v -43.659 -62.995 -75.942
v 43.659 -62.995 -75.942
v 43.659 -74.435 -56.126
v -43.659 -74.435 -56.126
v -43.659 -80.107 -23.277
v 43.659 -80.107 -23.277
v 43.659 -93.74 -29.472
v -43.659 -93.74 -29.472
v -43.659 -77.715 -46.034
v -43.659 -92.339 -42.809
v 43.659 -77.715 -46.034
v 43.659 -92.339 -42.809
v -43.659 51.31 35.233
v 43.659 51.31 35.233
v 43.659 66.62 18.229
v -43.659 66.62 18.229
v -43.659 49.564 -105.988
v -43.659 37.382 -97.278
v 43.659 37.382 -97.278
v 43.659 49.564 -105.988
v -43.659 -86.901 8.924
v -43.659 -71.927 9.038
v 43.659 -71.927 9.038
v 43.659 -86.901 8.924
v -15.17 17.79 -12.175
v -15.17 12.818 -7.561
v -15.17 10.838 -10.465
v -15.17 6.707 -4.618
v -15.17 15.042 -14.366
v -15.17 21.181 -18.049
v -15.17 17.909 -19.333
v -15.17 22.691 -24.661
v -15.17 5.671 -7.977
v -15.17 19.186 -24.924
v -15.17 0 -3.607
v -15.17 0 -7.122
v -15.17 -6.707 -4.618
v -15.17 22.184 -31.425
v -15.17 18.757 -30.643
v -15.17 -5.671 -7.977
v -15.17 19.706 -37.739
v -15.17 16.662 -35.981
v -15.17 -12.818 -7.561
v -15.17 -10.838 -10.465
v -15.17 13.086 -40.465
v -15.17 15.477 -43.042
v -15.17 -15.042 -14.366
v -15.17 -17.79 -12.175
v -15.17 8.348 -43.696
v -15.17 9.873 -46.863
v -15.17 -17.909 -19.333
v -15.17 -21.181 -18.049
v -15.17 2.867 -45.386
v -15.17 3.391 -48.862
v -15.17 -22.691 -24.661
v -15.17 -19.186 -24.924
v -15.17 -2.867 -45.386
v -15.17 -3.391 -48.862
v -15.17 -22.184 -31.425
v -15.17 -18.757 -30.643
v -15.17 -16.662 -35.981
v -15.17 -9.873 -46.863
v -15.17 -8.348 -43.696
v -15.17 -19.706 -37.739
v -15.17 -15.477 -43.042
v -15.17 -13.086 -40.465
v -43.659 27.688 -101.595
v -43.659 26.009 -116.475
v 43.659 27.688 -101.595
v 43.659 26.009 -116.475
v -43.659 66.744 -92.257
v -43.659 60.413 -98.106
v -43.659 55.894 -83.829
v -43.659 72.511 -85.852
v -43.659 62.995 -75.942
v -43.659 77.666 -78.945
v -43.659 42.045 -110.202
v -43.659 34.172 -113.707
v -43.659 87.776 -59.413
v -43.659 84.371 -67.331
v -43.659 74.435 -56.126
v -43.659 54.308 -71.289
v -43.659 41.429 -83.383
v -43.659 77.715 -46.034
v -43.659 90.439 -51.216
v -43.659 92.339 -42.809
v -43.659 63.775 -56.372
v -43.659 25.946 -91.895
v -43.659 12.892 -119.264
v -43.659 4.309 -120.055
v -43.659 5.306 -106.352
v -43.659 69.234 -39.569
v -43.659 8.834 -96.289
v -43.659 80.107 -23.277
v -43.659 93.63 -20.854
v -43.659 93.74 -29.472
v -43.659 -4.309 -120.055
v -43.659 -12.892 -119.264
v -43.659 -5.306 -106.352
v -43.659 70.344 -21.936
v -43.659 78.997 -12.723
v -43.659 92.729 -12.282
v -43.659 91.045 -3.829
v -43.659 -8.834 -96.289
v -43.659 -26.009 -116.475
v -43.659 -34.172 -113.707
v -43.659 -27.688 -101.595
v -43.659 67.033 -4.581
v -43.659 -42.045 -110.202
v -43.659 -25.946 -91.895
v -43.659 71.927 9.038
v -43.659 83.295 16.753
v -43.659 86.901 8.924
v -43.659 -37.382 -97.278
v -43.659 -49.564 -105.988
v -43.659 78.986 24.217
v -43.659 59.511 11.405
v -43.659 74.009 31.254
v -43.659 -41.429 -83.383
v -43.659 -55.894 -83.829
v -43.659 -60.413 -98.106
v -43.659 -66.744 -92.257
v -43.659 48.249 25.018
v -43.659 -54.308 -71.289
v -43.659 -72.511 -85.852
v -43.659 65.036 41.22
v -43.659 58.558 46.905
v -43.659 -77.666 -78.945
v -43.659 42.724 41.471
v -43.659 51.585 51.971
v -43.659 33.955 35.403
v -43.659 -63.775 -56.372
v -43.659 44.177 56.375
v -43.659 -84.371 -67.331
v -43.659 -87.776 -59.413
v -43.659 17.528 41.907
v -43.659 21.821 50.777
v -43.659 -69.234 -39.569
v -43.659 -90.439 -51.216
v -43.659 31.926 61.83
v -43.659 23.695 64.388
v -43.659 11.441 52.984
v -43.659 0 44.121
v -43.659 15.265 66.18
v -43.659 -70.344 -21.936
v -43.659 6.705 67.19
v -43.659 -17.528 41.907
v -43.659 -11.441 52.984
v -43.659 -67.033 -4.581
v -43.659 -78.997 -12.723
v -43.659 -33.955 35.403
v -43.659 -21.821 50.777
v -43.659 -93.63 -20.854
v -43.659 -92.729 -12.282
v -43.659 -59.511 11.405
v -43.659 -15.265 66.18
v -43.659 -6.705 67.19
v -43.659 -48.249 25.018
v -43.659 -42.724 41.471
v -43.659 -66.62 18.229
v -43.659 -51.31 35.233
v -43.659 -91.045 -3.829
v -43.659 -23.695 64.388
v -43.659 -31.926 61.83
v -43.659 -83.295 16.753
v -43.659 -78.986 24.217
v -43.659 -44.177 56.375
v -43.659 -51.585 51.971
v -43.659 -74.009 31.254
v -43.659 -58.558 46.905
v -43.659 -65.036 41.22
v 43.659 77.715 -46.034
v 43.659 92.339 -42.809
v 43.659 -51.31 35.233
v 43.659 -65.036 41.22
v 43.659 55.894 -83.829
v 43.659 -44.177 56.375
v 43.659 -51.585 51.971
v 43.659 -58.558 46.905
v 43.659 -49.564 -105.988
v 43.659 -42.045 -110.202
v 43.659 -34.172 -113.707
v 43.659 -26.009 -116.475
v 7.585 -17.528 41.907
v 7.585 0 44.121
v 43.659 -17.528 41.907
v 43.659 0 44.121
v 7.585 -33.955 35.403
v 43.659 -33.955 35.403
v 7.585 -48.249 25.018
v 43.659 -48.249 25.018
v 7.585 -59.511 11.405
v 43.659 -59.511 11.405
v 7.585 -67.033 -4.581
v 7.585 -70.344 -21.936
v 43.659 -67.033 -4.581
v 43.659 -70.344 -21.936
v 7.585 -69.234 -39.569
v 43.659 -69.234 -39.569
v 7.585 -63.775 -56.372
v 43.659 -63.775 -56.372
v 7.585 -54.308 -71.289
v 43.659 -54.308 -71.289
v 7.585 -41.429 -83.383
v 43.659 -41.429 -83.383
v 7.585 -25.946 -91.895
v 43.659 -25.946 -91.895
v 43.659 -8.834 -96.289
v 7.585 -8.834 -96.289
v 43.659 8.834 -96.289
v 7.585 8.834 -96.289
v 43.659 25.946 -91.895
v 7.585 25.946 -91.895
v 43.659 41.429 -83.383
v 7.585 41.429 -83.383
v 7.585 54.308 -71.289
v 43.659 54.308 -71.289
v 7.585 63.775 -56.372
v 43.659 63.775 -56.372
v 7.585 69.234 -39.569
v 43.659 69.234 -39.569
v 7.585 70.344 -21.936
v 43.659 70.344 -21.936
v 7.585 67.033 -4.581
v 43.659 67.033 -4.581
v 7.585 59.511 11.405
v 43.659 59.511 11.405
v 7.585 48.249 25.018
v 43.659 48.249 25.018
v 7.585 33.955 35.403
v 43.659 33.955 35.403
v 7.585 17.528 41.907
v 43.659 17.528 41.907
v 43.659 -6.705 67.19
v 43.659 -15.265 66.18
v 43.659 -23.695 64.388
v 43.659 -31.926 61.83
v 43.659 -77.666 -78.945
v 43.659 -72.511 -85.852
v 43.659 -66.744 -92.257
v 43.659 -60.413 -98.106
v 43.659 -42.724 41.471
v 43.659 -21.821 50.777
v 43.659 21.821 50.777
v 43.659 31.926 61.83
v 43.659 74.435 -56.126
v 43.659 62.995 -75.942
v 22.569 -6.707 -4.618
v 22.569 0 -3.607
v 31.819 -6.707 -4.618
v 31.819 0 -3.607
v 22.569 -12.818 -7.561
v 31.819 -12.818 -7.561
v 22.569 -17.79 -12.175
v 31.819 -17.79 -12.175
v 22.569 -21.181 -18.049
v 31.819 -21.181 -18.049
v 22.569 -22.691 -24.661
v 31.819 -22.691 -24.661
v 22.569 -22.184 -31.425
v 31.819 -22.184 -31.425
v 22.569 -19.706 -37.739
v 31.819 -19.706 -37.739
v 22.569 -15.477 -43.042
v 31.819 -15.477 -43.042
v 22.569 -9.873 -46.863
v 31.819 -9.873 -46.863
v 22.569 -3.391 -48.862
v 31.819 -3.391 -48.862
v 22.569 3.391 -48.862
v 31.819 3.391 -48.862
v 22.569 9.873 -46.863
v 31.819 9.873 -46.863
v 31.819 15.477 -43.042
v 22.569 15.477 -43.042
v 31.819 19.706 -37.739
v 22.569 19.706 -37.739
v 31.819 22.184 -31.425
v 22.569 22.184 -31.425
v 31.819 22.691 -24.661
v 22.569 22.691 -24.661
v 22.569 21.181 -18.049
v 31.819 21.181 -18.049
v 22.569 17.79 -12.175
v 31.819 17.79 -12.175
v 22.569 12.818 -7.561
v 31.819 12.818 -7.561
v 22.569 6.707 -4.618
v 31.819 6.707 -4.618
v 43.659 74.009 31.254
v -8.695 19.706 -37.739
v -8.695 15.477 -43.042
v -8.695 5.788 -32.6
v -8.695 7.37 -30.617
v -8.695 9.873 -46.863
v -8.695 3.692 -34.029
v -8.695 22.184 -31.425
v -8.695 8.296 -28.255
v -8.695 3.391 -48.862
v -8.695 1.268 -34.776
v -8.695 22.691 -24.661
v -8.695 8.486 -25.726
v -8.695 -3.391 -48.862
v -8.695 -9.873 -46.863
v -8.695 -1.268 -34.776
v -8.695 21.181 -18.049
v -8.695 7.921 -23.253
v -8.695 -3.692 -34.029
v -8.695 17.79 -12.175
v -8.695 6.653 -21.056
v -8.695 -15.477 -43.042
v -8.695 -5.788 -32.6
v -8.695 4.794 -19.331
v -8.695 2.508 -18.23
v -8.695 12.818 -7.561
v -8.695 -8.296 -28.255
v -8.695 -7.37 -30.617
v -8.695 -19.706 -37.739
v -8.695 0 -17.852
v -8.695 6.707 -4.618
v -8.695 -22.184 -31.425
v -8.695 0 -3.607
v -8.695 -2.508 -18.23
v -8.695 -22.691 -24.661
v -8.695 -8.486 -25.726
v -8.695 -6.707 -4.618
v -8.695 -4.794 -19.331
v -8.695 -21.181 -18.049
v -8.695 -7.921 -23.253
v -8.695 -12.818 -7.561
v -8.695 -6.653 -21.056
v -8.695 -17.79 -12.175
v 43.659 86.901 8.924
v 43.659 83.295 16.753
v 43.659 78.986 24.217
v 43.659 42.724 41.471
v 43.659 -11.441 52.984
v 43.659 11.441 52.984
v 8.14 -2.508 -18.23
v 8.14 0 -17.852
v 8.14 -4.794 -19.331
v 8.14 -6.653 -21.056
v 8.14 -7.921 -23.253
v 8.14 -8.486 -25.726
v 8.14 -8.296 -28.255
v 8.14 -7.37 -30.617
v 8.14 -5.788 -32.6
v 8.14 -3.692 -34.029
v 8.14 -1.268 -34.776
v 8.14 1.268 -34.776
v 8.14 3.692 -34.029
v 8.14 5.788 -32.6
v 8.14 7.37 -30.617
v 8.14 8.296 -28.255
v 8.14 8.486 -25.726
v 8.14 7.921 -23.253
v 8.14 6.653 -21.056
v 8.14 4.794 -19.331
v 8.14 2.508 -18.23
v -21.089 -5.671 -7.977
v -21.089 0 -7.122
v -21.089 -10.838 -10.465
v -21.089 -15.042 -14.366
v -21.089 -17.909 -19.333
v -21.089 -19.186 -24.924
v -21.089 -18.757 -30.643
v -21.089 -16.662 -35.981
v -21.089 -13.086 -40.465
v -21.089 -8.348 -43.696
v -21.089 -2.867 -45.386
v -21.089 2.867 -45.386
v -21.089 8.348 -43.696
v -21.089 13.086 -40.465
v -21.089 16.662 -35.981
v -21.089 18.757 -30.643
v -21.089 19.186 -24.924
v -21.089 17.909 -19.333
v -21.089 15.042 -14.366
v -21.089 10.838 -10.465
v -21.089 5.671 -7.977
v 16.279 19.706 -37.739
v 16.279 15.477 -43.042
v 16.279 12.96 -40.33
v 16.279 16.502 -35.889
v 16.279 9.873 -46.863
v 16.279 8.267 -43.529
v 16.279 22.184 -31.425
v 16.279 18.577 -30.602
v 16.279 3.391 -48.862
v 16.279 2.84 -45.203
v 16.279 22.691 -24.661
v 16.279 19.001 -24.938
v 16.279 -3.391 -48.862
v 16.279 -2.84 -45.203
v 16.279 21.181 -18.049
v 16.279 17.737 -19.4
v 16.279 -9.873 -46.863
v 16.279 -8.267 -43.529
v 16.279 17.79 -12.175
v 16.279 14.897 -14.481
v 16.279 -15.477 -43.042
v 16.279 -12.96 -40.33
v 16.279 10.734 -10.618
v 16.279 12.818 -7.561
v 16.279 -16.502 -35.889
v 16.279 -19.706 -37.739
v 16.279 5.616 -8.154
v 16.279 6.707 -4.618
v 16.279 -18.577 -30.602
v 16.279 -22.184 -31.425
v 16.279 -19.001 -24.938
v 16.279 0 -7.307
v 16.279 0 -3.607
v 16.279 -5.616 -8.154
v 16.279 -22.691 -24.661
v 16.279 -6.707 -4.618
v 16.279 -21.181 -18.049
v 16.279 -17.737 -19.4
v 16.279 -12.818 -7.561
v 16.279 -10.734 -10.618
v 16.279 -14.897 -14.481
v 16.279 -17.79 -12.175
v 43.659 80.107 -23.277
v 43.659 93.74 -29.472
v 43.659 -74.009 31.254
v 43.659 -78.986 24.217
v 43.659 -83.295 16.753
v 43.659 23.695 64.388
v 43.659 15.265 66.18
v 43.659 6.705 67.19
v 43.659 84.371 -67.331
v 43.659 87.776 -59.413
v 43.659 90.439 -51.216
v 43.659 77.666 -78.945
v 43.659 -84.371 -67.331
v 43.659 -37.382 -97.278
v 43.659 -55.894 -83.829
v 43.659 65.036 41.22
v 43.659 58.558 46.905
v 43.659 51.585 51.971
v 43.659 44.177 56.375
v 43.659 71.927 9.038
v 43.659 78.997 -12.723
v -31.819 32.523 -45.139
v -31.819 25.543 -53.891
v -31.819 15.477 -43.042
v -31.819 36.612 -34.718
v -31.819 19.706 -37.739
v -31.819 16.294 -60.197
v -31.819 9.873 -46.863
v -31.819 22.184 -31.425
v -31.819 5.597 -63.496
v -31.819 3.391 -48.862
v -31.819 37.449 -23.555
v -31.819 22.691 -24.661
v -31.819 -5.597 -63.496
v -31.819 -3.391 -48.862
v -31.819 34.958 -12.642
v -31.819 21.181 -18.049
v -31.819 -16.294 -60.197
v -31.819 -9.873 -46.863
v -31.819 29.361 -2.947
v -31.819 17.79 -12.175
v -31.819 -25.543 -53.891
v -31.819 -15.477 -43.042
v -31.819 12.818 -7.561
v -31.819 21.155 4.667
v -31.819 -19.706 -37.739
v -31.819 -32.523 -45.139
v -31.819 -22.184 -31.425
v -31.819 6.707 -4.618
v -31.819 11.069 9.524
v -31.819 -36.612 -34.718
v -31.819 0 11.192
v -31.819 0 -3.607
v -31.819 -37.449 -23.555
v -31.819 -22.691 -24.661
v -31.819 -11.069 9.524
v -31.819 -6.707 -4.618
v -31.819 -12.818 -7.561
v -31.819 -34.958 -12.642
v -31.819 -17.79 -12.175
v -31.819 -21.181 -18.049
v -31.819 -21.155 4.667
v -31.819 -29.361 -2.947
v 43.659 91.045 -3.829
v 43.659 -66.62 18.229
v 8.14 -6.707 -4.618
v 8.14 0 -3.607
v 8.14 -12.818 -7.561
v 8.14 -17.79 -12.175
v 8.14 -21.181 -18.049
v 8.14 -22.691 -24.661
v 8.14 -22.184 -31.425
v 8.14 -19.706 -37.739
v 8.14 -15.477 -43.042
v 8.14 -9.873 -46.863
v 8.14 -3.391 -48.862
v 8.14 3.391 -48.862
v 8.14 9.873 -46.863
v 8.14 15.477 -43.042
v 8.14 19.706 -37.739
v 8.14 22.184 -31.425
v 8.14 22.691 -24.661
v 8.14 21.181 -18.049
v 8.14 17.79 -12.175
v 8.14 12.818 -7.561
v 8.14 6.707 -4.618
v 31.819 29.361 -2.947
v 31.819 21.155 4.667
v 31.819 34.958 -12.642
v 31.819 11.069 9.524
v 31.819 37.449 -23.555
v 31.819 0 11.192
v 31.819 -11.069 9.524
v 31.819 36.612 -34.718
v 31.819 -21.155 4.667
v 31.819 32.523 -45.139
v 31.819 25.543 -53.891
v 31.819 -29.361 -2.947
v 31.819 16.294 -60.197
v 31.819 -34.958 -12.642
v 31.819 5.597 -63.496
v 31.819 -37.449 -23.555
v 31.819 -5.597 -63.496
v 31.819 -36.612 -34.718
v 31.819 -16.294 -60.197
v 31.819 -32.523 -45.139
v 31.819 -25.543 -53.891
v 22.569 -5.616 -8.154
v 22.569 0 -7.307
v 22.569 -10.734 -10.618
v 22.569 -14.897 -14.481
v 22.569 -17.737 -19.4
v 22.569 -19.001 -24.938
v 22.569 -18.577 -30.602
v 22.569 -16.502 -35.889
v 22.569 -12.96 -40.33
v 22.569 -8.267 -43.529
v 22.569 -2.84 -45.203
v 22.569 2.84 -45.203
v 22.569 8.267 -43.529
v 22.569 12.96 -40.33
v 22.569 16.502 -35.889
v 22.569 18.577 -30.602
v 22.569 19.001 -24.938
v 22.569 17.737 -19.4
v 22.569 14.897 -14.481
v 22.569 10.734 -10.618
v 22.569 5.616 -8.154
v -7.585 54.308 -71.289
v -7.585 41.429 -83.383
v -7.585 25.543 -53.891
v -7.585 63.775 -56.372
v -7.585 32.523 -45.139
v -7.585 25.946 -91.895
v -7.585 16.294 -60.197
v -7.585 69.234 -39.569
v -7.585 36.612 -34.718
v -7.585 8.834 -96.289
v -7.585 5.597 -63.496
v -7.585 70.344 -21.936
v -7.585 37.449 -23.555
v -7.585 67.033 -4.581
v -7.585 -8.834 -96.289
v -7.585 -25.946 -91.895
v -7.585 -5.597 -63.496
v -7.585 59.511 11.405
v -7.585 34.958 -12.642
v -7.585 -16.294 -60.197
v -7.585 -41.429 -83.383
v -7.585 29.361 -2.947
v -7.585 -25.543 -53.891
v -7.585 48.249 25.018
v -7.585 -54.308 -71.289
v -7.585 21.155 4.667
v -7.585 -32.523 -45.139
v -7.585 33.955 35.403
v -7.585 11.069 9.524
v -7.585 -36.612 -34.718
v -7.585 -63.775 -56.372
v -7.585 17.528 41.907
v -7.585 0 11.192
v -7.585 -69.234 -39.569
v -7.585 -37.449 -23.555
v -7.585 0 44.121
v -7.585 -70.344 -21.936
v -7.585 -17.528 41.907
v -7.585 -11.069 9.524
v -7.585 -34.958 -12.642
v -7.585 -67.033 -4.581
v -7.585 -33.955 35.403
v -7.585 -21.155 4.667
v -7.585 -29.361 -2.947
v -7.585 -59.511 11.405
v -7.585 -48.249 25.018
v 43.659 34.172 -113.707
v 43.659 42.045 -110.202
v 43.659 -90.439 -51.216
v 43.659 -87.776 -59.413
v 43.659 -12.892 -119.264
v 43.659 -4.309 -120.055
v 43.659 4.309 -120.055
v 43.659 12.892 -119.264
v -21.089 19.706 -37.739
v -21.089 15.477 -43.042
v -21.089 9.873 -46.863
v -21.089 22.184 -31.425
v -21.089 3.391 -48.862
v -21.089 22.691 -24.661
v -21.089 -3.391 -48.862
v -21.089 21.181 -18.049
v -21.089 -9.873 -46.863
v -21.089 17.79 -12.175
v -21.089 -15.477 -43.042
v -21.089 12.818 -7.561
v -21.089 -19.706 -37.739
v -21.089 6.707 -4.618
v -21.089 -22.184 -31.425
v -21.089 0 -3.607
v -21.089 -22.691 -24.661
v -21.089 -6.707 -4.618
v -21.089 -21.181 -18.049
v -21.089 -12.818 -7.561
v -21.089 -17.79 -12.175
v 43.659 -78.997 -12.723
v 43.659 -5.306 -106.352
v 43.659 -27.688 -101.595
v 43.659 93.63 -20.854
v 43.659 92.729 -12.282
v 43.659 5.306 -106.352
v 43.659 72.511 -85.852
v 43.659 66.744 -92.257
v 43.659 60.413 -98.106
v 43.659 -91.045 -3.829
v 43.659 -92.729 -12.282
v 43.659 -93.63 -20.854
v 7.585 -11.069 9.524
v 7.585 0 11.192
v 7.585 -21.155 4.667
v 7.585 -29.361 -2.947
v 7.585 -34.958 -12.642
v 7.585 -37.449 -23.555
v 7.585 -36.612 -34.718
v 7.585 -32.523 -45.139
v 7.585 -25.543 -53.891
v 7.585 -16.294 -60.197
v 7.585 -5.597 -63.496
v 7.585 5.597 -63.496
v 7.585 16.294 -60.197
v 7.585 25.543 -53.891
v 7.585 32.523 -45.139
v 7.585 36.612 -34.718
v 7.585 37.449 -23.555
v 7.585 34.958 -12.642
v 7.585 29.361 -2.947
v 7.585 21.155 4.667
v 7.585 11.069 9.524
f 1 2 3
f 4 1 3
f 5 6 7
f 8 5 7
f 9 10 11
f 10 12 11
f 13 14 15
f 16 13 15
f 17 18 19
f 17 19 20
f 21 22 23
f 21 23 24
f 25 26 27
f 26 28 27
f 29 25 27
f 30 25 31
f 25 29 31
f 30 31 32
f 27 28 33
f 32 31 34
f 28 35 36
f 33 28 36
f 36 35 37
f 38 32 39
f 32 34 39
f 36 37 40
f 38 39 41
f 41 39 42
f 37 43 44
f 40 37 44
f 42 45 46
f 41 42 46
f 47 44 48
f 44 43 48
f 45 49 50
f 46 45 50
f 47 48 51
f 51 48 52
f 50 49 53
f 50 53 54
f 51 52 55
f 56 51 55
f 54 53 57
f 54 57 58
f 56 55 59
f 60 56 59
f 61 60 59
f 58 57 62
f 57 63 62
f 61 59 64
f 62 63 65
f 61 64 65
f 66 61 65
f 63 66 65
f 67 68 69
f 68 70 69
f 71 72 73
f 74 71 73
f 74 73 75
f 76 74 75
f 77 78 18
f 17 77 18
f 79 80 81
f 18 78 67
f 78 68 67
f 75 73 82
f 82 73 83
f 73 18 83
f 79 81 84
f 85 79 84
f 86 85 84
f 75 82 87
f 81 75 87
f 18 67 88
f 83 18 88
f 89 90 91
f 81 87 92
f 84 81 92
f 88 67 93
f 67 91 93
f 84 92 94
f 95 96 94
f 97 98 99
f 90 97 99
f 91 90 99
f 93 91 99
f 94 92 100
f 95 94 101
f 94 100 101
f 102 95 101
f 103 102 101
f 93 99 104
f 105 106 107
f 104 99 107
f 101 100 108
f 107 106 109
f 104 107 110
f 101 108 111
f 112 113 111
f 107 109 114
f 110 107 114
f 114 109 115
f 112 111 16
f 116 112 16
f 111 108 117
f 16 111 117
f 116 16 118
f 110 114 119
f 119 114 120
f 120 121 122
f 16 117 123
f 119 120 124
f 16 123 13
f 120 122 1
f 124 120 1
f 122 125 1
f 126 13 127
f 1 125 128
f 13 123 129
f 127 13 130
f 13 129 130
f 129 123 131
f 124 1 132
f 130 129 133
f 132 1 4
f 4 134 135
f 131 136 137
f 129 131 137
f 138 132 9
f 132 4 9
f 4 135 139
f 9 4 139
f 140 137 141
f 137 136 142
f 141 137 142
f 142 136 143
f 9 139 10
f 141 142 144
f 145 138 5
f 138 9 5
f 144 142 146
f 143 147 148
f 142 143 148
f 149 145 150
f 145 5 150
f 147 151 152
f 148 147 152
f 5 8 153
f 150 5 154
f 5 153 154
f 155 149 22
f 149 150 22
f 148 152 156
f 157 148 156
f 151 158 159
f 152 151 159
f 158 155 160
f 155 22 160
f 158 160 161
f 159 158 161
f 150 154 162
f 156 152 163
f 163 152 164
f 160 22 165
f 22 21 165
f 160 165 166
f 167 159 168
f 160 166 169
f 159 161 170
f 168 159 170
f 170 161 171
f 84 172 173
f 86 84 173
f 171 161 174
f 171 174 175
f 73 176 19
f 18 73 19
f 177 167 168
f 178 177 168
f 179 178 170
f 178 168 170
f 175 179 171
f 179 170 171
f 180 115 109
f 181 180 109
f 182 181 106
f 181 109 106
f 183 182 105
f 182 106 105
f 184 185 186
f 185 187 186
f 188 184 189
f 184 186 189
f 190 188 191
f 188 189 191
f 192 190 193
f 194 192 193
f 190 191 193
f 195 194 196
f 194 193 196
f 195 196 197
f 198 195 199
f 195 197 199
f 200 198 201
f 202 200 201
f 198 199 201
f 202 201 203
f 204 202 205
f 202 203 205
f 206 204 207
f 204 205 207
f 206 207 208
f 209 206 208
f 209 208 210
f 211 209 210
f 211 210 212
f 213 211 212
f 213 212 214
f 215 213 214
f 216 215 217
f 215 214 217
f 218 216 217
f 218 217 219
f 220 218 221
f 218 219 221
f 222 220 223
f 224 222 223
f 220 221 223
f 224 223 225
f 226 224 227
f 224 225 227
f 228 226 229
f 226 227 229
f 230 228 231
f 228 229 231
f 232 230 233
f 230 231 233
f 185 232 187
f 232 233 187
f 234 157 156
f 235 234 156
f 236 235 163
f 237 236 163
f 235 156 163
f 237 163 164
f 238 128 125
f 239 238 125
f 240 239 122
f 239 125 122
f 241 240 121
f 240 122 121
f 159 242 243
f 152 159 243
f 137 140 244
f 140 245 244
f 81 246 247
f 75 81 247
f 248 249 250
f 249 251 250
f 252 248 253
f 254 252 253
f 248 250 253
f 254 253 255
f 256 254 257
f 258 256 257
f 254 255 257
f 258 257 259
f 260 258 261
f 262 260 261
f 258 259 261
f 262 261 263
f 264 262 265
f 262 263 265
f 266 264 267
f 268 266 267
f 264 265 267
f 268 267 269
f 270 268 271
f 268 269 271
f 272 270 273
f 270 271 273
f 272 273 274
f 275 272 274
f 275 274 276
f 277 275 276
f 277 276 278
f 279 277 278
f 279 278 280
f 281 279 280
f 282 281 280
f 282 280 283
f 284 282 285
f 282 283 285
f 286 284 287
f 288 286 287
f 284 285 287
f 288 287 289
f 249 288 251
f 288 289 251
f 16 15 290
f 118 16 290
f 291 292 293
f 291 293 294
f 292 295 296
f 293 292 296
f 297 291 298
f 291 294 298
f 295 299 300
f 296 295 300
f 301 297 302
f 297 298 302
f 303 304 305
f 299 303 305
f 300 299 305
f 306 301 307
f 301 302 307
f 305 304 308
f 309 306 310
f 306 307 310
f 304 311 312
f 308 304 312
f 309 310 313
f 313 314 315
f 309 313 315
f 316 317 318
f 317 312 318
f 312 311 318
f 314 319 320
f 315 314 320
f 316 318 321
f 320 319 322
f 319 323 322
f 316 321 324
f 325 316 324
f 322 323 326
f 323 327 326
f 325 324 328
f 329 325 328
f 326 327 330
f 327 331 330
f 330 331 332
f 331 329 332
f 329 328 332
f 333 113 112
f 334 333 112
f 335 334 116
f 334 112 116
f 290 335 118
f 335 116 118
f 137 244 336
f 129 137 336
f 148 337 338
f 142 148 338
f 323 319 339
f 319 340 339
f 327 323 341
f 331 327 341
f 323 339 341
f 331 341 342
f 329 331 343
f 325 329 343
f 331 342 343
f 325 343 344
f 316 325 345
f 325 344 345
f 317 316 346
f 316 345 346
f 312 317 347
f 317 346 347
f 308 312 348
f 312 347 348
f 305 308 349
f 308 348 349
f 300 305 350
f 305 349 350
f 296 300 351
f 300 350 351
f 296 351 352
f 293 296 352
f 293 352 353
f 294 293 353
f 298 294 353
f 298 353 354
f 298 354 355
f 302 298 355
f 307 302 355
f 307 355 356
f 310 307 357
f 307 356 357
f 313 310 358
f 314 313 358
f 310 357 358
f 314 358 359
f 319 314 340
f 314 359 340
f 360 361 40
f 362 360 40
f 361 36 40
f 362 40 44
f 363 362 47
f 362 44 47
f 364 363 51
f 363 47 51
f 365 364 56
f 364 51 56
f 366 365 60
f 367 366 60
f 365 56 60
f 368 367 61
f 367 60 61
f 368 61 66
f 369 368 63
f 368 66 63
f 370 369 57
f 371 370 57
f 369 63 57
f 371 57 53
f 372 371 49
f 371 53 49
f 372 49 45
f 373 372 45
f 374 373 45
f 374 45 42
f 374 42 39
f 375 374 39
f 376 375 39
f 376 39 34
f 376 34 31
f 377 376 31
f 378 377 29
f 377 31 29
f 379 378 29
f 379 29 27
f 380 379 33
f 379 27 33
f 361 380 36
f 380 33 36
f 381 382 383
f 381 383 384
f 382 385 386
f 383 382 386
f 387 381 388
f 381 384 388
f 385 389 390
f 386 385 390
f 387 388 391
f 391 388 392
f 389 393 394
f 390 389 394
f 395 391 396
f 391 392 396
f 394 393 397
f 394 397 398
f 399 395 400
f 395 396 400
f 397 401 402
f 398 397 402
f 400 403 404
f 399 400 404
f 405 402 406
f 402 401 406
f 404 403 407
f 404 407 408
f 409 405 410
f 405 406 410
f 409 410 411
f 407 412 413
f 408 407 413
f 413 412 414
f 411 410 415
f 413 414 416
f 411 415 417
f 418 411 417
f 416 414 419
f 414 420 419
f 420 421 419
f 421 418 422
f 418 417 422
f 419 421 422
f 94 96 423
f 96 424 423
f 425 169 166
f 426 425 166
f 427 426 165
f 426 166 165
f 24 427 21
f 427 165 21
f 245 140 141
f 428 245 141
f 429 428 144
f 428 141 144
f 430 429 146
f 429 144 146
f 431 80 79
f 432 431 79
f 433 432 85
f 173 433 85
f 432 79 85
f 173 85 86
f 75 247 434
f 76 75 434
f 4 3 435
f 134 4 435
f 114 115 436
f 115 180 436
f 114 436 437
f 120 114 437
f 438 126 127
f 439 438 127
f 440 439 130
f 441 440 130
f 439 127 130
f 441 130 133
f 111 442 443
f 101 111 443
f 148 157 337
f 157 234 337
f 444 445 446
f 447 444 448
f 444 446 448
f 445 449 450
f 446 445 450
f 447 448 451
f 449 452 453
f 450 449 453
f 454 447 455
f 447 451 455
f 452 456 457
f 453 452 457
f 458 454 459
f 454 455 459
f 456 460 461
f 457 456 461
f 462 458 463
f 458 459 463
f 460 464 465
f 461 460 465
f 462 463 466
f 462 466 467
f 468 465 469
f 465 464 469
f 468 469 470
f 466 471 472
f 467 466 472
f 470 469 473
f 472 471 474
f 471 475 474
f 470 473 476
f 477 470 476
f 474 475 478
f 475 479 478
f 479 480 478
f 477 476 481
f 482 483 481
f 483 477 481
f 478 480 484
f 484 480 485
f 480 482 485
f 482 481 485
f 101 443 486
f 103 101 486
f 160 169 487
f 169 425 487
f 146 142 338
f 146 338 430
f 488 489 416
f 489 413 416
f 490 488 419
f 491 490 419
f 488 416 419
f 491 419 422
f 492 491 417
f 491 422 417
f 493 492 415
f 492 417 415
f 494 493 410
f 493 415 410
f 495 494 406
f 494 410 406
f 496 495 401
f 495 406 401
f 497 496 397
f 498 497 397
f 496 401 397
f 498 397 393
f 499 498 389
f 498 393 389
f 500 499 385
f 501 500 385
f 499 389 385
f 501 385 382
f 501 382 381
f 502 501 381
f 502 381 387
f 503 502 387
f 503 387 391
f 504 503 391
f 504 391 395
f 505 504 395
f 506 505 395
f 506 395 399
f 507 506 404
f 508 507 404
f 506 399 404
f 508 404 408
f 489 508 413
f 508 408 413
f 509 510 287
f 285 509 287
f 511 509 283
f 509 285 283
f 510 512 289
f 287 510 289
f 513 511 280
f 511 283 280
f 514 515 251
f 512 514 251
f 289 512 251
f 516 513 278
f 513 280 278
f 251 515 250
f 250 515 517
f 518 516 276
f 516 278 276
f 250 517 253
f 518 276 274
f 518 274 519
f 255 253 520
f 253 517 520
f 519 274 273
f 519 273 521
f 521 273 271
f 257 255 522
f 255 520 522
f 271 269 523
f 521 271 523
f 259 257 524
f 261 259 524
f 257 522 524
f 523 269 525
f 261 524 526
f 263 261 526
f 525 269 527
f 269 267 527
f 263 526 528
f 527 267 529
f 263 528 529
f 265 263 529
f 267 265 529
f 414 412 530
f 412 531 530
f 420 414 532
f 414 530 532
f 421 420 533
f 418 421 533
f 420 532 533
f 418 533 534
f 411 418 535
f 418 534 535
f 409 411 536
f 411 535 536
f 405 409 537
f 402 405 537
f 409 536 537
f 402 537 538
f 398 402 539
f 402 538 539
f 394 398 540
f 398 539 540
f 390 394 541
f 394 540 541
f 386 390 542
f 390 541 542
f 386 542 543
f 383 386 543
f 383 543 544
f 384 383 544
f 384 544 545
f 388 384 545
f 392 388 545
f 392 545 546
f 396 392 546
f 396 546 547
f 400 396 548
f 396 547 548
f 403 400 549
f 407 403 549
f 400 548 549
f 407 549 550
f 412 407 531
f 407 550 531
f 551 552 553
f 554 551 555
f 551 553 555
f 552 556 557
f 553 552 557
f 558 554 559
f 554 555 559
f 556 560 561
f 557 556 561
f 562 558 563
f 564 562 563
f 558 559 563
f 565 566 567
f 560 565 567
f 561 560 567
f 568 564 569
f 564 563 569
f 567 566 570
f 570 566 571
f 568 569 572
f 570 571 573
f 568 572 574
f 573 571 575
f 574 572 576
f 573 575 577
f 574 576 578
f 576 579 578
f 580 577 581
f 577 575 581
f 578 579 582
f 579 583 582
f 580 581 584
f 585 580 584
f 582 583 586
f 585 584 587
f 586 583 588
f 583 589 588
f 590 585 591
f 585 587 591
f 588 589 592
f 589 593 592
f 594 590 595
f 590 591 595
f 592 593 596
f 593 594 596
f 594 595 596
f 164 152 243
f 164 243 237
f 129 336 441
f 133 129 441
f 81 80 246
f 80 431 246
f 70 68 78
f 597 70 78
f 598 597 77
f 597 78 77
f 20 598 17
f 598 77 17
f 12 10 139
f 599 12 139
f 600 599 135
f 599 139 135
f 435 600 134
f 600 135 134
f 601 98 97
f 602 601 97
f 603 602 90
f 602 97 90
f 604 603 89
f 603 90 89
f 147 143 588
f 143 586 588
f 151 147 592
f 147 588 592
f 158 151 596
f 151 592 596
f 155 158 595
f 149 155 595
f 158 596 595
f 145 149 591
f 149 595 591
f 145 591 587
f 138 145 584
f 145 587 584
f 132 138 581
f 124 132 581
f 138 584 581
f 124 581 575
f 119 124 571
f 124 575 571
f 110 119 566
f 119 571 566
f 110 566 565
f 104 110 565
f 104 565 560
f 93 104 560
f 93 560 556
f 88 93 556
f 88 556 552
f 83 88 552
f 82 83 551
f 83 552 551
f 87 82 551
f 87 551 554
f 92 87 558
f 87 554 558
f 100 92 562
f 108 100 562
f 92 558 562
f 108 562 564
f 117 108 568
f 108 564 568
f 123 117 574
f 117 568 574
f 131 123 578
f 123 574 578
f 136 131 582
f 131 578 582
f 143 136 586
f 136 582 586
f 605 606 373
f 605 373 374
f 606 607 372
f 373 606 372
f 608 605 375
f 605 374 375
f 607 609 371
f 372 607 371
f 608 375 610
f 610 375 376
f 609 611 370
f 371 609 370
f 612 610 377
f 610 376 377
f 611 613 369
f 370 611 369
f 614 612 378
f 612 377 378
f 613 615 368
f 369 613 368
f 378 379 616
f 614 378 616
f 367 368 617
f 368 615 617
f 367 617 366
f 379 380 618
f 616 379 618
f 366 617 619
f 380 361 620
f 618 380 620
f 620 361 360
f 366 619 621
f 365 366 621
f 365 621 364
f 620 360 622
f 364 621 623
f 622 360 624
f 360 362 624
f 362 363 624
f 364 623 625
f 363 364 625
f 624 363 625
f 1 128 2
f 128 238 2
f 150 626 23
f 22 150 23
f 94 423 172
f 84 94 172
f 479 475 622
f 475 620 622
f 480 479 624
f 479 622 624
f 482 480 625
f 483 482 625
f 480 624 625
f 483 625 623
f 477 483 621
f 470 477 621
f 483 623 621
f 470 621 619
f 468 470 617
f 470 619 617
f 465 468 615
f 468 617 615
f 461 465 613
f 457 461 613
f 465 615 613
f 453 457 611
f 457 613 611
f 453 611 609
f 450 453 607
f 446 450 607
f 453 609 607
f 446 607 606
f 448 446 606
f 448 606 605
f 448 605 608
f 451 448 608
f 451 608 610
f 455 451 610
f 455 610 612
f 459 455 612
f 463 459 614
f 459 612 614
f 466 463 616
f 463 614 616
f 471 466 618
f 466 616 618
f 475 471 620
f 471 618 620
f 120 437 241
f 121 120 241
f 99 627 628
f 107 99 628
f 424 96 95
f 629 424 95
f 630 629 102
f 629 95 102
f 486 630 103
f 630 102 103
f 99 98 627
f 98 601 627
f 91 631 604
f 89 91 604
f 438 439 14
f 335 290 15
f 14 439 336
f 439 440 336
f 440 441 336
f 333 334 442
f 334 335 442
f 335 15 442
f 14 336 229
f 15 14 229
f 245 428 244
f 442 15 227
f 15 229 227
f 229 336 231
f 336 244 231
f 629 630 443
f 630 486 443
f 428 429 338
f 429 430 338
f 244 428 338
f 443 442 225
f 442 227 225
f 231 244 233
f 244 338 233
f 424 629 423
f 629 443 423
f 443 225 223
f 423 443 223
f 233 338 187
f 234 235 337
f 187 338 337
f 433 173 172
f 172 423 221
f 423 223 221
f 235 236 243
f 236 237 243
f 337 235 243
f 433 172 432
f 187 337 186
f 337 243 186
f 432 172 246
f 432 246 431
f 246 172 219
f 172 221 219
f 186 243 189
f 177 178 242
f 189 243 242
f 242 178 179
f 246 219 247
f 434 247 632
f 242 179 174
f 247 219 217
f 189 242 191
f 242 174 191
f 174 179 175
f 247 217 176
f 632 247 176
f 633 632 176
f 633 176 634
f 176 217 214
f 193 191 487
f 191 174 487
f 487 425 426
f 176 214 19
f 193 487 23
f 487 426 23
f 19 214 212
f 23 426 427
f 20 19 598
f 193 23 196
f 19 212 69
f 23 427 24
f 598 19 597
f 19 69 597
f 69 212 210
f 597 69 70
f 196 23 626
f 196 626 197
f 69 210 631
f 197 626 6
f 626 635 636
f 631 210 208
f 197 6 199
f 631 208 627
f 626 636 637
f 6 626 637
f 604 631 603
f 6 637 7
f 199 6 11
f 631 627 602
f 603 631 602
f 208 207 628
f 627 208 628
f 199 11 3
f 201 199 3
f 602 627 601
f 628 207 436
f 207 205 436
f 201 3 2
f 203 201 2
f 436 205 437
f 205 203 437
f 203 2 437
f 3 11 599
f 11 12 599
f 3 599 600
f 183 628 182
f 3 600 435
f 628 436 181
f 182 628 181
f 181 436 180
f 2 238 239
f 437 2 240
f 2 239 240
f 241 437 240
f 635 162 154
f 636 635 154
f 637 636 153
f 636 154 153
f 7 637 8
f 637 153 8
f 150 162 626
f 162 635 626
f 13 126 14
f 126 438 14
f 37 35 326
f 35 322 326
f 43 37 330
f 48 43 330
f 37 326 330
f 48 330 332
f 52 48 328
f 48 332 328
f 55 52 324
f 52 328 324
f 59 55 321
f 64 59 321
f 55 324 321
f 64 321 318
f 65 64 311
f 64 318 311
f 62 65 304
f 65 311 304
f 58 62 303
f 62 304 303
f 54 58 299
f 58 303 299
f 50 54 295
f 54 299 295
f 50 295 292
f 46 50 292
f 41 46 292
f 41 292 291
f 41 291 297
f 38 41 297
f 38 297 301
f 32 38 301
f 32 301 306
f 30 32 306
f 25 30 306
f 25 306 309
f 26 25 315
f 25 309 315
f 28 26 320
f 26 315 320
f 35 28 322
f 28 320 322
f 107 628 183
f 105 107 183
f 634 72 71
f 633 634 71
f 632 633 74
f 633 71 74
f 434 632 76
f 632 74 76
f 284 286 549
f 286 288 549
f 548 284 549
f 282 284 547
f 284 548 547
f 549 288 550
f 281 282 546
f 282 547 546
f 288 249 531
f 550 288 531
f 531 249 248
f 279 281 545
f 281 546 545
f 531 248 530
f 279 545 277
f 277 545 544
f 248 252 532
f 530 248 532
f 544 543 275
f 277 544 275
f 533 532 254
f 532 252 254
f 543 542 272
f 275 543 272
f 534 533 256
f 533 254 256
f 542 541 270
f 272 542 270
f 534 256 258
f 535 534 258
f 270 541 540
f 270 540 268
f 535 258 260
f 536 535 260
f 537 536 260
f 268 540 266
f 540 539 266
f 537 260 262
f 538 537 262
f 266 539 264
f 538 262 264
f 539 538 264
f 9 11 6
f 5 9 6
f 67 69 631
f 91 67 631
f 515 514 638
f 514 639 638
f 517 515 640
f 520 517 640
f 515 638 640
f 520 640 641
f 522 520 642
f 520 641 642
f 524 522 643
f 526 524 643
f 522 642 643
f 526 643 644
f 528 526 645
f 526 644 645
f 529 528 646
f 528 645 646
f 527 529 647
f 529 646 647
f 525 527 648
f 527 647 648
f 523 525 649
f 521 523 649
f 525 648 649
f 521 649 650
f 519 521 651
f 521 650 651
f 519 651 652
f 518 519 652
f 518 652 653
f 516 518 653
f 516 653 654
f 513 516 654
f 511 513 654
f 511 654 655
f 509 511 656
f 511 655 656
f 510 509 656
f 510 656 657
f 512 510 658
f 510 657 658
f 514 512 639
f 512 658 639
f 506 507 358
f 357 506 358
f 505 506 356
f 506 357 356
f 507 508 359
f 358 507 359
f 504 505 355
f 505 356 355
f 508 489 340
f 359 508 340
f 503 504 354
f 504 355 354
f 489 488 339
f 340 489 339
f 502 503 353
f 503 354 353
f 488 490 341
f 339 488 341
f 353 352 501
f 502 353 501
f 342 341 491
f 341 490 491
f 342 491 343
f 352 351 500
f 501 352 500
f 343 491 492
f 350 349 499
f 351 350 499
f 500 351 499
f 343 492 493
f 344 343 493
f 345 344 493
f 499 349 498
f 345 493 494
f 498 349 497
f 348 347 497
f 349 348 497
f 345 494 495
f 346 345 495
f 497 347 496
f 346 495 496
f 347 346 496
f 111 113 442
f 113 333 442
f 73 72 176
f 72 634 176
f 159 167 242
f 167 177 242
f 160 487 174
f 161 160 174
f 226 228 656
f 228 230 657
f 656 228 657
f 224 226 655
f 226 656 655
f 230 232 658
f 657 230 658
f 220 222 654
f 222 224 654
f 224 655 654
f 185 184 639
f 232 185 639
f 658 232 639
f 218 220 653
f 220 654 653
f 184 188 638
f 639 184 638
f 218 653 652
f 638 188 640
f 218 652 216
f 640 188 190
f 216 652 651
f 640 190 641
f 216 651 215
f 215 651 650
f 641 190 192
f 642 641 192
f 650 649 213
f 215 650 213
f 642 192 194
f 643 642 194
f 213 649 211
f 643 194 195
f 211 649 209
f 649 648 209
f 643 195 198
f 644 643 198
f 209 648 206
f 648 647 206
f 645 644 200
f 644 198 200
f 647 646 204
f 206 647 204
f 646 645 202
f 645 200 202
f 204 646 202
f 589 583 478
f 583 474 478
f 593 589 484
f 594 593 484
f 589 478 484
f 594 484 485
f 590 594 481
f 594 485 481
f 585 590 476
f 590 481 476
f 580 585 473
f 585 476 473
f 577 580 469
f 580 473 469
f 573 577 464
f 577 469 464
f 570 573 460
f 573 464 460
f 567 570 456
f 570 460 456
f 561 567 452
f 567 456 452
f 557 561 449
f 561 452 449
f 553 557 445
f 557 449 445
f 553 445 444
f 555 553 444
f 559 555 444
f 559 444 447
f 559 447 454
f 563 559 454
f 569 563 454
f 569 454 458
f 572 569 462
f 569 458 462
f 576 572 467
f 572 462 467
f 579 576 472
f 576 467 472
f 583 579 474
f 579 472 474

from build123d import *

# Parameters (mm, degrees)
F3_DEPTH = 55.88
F4_COUNT = 15


with BuildPart() as f1:
    # F0 (on Front) → F1 (revolve)
    with BuildSketch(Plane.XZ):
        Polygon((-43.6586365104, 67.430395633), (-43.6586365104, 44.1211201251), (-7.5847627595, 44.1211201251), (-7.5847627595, 11.192150414), (-31.8190082908, 11.192150414), (-31.8190082908, -3.6073876545), (-21.0893414915, -3.6073876545), (-21.0893414915, -7.1222772822), (-15.1695264503, -7.1222772822), (-15.1695264503, -3.6073876545), (-8.6947288364, -3.6073876545), (-8.6947288364, -17.8519431502), (8.1397471949, -17.8519431502), (8.1397471949, -3.6073876545), (16.2794925272, -3.6073876545), (16.2794925272, -7.3072714731), (22.5692950189, -7.3072714731), (22.5692950189, -3.6073876545), (31.8190082908, -3.6073876545), (31.8190082908, 11.192150414), (7.5847627595, 11.192150414), (7.5847627595, 44.1211201251), (43.6586365104, 44.1211201251), (43.6586365104, 67.430395633), align=None)
    revolve(axis=Axis((0, 0, -26.361675933), (1, 0, 0)))

    # F2 (on Right) → F3 (cut, symmetric)
    with BuildSketch(Plane.YZ):
        Polygon((11.4407278597, 52.9837198555), (5.9587107971, 69.429770112), (-5.9587107971, 69.429770112), (-11.4407278597, 52.9837198555), align=None)
    f3 = extrude(amount=F3_DEPTH, both=True, mode=Mode.SUBTRACT)

    # F4: F3 ×15 about axis
    f4_axis = Axis((31.8190082908, 0, -26.361675933), (1, 0, 0))
    for i in range(1, F4_COUNT):
        add(f3.rotate(f4_axis, i * 360 / F4_COUNT), mode=Mode.SUBTRACT)


solid = f1.part
